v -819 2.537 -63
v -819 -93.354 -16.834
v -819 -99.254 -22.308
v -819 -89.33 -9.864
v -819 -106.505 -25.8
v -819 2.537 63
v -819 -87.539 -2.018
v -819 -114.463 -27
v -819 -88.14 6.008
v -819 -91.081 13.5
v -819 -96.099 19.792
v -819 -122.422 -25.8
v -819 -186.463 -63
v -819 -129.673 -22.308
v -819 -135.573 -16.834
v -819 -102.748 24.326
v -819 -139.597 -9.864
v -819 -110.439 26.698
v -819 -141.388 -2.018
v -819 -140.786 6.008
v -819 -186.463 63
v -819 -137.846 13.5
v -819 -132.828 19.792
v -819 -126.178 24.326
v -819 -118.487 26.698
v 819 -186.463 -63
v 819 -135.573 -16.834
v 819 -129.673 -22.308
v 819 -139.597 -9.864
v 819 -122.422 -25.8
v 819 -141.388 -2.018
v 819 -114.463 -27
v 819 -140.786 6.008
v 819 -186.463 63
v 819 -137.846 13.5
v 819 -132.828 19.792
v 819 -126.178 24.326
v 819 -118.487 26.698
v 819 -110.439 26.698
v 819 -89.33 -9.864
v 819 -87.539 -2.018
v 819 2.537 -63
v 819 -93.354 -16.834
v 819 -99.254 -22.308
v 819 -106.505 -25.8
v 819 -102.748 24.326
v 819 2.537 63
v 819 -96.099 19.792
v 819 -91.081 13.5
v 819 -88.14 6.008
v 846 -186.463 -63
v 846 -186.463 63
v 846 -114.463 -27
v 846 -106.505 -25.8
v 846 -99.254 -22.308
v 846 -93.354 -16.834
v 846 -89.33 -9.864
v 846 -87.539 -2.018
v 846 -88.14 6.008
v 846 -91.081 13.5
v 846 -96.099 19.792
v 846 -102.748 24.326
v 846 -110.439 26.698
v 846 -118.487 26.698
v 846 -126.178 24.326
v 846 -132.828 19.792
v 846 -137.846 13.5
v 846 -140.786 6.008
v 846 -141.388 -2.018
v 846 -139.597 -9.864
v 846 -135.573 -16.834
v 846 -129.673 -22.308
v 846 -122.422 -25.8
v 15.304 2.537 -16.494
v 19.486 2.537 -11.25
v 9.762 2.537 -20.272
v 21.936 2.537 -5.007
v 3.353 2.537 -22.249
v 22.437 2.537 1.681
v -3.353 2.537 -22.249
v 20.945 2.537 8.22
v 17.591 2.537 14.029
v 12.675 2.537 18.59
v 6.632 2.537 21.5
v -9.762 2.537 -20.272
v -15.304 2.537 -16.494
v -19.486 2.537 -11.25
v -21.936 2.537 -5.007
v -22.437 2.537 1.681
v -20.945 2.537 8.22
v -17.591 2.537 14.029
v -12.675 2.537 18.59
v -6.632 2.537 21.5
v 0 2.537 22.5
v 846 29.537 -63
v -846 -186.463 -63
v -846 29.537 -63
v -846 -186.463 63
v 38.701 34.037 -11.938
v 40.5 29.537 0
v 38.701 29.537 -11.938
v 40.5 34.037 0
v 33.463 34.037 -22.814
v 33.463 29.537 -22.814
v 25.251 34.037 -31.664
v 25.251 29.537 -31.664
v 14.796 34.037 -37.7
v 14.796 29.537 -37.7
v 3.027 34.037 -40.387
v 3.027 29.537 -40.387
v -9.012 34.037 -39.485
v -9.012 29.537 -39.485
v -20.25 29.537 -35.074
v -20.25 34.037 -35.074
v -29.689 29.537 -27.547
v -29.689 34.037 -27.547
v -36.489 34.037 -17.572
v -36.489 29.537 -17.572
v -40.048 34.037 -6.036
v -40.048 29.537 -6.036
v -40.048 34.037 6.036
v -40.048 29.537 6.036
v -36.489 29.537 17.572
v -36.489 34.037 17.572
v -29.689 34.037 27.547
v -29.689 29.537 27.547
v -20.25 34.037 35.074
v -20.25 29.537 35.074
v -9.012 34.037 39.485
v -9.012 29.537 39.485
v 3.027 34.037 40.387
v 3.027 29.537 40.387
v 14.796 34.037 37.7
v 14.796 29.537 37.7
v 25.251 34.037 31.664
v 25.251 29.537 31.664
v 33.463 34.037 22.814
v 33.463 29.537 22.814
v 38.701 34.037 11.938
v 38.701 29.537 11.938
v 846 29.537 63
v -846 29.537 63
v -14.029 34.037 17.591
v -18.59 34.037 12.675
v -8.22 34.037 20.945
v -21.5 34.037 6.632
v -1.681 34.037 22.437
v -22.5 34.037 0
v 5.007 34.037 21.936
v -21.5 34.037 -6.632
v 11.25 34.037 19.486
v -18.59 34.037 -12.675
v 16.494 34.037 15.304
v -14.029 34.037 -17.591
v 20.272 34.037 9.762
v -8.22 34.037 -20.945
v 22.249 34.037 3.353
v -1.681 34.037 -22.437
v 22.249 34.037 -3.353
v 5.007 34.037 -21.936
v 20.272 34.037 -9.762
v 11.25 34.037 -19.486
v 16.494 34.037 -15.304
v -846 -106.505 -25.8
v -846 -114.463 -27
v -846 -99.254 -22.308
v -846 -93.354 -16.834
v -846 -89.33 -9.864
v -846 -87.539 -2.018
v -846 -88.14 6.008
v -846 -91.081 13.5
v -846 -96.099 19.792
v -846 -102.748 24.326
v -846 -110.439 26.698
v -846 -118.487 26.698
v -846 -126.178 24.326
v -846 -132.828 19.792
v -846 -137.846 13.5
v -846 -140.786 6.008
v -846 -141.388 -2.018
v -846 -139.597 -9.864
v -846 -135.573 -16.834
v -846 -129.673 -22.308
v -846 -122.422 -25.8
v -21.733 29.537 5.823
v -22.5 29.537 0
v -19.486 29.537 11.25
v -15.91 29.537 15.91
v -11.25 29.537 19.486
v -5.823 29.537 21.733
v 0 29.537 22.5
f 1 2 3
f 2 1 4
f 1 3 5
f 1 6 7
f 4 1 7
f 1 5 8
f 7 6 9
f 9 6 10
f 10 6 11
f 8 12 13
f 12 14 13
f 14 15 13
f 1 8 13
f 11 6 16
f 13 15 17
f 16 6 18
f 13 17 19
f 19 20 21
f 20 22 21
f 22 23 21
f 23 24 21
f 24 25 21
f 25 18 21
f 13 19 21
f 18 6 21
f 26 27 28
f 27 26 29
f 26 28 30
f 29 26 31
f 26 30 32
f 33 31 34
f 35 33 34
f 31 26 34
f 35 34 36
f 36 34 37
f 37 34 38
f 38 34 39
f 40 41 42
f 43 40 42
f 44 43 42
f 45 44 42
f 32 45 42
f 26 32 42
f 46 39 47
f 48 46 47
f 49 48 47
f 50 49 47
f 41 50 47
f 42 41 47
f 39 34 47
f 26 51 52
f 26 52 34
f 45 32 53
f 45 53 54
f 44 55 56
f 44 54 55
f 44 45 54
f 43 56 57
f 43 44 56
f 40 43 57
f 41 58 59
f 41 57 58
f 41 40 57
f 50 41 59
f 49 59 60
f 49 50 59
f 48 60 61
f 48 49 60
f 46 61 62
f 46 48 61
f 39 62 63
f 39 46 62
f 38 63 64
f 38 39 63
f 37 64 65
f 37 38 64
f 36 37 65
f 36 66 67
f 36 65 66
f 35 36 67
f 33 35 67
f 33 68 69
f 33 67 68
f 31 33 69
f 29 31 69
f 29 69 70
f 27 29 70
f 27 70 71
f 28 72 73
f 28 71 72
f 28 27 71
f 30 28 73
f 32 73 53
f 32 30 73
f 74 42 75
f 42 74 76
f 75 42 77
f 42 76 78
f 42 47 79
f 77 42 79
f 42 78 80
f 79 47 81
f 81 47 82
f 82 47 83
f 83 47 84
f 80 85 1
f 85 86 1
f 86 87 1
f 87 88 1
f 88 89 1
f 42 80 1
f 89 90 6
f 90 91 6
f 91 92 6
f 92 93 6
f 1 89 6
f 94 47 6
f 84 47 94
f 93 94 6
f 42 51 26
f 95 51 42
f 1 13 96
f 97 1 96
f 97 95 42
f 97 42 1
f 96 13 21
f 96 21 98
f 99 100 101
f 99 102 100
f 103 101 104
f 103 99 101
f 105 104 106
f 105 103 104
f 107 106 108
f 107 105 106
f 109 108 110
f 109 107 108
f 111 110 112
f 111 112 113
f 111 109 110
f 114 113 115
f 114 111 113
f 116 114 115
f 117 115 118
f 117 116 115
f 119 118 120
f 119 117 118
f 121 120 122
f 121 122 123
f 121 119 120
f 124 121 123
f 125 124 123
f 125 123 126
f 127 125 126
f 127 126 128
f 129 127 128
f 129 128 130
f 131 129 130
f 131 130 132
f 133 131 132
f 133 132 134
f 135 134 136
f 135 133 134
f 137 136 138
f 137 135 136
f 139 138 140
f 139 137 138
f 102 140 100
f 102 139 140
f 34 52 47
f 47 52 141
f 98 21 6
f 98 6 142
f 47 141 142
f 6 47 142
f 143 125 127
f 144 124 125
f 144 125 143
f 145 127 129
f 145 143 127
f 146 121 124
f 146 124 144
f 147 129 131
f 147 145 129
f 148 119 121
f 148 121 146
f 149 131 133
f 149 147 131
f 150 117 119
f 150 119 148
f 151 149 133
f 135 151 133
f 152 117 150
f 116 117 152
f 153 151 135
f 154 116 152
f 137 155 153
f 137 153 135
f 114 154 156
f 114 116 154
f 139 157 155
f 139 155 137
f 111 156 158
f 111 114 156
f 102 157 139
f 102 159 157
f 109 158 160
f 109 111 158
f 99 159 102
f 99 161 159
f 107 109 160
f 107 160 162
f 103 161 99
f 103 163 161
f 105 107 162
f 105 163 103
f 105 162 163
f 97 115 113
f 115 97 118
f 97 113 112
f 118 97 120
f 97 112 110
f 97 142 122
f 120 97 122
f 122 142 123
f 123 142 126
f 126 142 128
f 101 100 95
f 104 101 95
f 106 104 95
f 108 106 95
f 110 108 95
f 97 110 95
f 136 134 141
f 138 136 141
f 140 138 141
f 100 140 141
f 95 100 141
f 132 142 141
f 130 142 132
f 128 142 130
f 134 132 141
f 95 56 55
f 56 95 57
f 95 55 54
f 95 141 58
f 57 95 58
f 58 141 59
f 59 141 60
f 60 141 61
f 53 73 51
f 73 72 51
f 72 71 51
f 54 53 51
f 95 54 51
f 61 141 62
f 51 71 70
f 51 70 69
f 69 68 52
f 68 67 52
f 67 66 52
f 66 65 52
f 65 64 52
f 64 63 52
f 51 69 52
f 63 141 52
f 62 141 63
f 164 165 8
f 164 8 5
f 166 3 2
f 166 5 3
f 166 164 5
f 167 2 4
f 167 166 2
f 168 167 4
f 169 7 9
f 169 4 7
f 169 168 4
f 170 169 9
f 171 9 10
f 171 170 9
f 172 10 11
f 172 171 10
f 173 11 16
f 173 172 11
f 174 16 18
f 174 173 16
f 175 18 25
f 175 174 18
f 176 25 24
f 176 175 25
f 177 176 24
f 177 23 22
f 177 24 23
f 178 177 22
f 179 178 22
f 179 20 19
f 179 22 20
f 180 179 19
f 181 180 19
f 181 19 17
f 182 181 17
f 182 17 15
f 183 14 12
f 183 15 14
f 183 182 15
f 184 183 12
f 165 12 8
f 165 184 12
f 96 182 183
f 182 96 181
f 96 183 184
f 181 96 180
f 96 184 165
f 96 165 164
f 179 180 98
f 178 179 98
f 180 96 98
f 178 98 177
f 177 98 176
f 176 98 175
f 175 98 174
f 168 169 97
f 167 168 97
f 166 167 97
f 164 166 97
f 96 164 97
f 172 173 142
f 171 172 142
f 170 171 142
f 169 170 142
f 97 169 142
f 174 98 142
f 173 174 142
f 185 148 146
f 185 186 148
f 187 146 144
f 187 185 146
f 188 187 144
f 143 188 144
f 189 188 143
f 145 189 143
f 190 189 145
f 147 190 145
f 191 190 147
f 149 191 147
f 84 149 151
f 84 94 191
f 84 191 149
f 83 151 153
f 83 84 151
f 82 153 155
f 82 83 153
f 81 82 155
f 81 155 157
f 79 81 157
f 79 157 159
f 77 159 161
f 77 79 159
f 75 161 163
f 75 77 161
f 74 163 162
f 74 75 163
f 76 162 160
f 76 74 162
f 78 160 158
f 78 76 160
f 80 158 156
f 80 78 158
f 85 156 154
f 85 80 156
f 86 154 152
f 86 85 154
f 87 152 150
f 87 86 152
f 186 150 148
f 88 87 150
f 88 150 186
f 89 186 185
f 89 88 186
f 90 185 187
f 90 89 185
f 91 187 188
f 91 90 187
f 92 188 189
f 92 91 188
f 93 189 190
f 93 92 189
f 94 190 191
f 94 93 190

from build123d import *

# Parameters (mm, degrees)
BOSS_EXTRUDE1_DEPTH     = 3.5
CUT_EXTRUDE1_DEPTH      = 49.633835958
CUT_EXTRUDE1_DEPTH_BACK = 1.5
SKETCH2_R               = 1.25
SKETCH3_R               = 2.25
SKETCH3_R_2             = 1.25
BOSS_EXTRUDE2_DEPTH     = 0.25
CUT_EXTRUDE2_DEPTH      = 49.633835958
CUT_EXTRUDE2_DEPTH_BACK = 49.633835958
SKETCH4_R               = 1.5
SCALE1_SCALE            = 18


with BuildPart() as part:
    # Sketch1 → Boss-Extrude1 (new, symmetric)
    with BuildSketch(Plane.XY):
        Polygon((-47, -12), (-47, 0), (47, 0), (47, -12), (45.5, -12), (45.5, -1.5), (-45.5, -1.5), (-45.5, -12), align=None)
    extrude(amount=BOSS_EXTRUDE1_DEPTH, both=True)

    # Sketch2 → Cut-Extrude1 (cut, two sides: drawn at the far end of the back side and taken through both)
    with BuildSketch(Plane(origin=(0, 0, 0), x_dir=(1, 0, 0), z_dir=(0, 1, 0)).offset(-CUT_EXTRUDE1_DEPTH_BACK)):
        with Locations(Location((0, 0, 0), (0, 0, 270))):
            Circle(SKETCH2_R)
    extrude(amount=CUT_EXTRUDE1_DEPTH + CUT_EXTRUDE1_DEPTH_BACK, mode=Mode.SUBTRACT)

    # Sketch3 → Boss-Extrude2 (add, symmetric)
    with BuildSketch(Plane(origin=(0, 0, 0), x_dir=(1, 0, 0), z_dir=(0, 1, 0))):
        Circle(SKETCH3_R)
        with Locations(Location((0, 0, 0), (0, 0, 180))):
            Circle(SKETCH3_R_2, mode=Mode.SUBTRACT)
    extrude(amount=BOSS_EXTRUDE2_DEPTH, both=True)

    # Sketch4 → Cut-Extrude2 (cut, two sides: drawn at the far end of the back side and taken through both)
    with BuildSketch(Plane(origin=(0, 0, 0), x_dir=(0, 0, -1), z_dir=(1, 0, 0)).offset(-CUT_EXTRUDE2_DEPTH_BACK)):
        with Locations((0, -8)):
            Circle(SKETCH4_R)
    extrude(amount=CUT_EXTRUDE2_DEPTH + CUT_EXTRUDE2_DEPTH_BACK, mode=Mode.SUBTRACT)


with BuildPart() as part_1:
    # Scale1: scaled about (0, -1.737452604, 0)
    add(part.part.scale(SCALE1_SCALE).moved(Location((0, 29.536694268, 0))))


solid = part_1.part
